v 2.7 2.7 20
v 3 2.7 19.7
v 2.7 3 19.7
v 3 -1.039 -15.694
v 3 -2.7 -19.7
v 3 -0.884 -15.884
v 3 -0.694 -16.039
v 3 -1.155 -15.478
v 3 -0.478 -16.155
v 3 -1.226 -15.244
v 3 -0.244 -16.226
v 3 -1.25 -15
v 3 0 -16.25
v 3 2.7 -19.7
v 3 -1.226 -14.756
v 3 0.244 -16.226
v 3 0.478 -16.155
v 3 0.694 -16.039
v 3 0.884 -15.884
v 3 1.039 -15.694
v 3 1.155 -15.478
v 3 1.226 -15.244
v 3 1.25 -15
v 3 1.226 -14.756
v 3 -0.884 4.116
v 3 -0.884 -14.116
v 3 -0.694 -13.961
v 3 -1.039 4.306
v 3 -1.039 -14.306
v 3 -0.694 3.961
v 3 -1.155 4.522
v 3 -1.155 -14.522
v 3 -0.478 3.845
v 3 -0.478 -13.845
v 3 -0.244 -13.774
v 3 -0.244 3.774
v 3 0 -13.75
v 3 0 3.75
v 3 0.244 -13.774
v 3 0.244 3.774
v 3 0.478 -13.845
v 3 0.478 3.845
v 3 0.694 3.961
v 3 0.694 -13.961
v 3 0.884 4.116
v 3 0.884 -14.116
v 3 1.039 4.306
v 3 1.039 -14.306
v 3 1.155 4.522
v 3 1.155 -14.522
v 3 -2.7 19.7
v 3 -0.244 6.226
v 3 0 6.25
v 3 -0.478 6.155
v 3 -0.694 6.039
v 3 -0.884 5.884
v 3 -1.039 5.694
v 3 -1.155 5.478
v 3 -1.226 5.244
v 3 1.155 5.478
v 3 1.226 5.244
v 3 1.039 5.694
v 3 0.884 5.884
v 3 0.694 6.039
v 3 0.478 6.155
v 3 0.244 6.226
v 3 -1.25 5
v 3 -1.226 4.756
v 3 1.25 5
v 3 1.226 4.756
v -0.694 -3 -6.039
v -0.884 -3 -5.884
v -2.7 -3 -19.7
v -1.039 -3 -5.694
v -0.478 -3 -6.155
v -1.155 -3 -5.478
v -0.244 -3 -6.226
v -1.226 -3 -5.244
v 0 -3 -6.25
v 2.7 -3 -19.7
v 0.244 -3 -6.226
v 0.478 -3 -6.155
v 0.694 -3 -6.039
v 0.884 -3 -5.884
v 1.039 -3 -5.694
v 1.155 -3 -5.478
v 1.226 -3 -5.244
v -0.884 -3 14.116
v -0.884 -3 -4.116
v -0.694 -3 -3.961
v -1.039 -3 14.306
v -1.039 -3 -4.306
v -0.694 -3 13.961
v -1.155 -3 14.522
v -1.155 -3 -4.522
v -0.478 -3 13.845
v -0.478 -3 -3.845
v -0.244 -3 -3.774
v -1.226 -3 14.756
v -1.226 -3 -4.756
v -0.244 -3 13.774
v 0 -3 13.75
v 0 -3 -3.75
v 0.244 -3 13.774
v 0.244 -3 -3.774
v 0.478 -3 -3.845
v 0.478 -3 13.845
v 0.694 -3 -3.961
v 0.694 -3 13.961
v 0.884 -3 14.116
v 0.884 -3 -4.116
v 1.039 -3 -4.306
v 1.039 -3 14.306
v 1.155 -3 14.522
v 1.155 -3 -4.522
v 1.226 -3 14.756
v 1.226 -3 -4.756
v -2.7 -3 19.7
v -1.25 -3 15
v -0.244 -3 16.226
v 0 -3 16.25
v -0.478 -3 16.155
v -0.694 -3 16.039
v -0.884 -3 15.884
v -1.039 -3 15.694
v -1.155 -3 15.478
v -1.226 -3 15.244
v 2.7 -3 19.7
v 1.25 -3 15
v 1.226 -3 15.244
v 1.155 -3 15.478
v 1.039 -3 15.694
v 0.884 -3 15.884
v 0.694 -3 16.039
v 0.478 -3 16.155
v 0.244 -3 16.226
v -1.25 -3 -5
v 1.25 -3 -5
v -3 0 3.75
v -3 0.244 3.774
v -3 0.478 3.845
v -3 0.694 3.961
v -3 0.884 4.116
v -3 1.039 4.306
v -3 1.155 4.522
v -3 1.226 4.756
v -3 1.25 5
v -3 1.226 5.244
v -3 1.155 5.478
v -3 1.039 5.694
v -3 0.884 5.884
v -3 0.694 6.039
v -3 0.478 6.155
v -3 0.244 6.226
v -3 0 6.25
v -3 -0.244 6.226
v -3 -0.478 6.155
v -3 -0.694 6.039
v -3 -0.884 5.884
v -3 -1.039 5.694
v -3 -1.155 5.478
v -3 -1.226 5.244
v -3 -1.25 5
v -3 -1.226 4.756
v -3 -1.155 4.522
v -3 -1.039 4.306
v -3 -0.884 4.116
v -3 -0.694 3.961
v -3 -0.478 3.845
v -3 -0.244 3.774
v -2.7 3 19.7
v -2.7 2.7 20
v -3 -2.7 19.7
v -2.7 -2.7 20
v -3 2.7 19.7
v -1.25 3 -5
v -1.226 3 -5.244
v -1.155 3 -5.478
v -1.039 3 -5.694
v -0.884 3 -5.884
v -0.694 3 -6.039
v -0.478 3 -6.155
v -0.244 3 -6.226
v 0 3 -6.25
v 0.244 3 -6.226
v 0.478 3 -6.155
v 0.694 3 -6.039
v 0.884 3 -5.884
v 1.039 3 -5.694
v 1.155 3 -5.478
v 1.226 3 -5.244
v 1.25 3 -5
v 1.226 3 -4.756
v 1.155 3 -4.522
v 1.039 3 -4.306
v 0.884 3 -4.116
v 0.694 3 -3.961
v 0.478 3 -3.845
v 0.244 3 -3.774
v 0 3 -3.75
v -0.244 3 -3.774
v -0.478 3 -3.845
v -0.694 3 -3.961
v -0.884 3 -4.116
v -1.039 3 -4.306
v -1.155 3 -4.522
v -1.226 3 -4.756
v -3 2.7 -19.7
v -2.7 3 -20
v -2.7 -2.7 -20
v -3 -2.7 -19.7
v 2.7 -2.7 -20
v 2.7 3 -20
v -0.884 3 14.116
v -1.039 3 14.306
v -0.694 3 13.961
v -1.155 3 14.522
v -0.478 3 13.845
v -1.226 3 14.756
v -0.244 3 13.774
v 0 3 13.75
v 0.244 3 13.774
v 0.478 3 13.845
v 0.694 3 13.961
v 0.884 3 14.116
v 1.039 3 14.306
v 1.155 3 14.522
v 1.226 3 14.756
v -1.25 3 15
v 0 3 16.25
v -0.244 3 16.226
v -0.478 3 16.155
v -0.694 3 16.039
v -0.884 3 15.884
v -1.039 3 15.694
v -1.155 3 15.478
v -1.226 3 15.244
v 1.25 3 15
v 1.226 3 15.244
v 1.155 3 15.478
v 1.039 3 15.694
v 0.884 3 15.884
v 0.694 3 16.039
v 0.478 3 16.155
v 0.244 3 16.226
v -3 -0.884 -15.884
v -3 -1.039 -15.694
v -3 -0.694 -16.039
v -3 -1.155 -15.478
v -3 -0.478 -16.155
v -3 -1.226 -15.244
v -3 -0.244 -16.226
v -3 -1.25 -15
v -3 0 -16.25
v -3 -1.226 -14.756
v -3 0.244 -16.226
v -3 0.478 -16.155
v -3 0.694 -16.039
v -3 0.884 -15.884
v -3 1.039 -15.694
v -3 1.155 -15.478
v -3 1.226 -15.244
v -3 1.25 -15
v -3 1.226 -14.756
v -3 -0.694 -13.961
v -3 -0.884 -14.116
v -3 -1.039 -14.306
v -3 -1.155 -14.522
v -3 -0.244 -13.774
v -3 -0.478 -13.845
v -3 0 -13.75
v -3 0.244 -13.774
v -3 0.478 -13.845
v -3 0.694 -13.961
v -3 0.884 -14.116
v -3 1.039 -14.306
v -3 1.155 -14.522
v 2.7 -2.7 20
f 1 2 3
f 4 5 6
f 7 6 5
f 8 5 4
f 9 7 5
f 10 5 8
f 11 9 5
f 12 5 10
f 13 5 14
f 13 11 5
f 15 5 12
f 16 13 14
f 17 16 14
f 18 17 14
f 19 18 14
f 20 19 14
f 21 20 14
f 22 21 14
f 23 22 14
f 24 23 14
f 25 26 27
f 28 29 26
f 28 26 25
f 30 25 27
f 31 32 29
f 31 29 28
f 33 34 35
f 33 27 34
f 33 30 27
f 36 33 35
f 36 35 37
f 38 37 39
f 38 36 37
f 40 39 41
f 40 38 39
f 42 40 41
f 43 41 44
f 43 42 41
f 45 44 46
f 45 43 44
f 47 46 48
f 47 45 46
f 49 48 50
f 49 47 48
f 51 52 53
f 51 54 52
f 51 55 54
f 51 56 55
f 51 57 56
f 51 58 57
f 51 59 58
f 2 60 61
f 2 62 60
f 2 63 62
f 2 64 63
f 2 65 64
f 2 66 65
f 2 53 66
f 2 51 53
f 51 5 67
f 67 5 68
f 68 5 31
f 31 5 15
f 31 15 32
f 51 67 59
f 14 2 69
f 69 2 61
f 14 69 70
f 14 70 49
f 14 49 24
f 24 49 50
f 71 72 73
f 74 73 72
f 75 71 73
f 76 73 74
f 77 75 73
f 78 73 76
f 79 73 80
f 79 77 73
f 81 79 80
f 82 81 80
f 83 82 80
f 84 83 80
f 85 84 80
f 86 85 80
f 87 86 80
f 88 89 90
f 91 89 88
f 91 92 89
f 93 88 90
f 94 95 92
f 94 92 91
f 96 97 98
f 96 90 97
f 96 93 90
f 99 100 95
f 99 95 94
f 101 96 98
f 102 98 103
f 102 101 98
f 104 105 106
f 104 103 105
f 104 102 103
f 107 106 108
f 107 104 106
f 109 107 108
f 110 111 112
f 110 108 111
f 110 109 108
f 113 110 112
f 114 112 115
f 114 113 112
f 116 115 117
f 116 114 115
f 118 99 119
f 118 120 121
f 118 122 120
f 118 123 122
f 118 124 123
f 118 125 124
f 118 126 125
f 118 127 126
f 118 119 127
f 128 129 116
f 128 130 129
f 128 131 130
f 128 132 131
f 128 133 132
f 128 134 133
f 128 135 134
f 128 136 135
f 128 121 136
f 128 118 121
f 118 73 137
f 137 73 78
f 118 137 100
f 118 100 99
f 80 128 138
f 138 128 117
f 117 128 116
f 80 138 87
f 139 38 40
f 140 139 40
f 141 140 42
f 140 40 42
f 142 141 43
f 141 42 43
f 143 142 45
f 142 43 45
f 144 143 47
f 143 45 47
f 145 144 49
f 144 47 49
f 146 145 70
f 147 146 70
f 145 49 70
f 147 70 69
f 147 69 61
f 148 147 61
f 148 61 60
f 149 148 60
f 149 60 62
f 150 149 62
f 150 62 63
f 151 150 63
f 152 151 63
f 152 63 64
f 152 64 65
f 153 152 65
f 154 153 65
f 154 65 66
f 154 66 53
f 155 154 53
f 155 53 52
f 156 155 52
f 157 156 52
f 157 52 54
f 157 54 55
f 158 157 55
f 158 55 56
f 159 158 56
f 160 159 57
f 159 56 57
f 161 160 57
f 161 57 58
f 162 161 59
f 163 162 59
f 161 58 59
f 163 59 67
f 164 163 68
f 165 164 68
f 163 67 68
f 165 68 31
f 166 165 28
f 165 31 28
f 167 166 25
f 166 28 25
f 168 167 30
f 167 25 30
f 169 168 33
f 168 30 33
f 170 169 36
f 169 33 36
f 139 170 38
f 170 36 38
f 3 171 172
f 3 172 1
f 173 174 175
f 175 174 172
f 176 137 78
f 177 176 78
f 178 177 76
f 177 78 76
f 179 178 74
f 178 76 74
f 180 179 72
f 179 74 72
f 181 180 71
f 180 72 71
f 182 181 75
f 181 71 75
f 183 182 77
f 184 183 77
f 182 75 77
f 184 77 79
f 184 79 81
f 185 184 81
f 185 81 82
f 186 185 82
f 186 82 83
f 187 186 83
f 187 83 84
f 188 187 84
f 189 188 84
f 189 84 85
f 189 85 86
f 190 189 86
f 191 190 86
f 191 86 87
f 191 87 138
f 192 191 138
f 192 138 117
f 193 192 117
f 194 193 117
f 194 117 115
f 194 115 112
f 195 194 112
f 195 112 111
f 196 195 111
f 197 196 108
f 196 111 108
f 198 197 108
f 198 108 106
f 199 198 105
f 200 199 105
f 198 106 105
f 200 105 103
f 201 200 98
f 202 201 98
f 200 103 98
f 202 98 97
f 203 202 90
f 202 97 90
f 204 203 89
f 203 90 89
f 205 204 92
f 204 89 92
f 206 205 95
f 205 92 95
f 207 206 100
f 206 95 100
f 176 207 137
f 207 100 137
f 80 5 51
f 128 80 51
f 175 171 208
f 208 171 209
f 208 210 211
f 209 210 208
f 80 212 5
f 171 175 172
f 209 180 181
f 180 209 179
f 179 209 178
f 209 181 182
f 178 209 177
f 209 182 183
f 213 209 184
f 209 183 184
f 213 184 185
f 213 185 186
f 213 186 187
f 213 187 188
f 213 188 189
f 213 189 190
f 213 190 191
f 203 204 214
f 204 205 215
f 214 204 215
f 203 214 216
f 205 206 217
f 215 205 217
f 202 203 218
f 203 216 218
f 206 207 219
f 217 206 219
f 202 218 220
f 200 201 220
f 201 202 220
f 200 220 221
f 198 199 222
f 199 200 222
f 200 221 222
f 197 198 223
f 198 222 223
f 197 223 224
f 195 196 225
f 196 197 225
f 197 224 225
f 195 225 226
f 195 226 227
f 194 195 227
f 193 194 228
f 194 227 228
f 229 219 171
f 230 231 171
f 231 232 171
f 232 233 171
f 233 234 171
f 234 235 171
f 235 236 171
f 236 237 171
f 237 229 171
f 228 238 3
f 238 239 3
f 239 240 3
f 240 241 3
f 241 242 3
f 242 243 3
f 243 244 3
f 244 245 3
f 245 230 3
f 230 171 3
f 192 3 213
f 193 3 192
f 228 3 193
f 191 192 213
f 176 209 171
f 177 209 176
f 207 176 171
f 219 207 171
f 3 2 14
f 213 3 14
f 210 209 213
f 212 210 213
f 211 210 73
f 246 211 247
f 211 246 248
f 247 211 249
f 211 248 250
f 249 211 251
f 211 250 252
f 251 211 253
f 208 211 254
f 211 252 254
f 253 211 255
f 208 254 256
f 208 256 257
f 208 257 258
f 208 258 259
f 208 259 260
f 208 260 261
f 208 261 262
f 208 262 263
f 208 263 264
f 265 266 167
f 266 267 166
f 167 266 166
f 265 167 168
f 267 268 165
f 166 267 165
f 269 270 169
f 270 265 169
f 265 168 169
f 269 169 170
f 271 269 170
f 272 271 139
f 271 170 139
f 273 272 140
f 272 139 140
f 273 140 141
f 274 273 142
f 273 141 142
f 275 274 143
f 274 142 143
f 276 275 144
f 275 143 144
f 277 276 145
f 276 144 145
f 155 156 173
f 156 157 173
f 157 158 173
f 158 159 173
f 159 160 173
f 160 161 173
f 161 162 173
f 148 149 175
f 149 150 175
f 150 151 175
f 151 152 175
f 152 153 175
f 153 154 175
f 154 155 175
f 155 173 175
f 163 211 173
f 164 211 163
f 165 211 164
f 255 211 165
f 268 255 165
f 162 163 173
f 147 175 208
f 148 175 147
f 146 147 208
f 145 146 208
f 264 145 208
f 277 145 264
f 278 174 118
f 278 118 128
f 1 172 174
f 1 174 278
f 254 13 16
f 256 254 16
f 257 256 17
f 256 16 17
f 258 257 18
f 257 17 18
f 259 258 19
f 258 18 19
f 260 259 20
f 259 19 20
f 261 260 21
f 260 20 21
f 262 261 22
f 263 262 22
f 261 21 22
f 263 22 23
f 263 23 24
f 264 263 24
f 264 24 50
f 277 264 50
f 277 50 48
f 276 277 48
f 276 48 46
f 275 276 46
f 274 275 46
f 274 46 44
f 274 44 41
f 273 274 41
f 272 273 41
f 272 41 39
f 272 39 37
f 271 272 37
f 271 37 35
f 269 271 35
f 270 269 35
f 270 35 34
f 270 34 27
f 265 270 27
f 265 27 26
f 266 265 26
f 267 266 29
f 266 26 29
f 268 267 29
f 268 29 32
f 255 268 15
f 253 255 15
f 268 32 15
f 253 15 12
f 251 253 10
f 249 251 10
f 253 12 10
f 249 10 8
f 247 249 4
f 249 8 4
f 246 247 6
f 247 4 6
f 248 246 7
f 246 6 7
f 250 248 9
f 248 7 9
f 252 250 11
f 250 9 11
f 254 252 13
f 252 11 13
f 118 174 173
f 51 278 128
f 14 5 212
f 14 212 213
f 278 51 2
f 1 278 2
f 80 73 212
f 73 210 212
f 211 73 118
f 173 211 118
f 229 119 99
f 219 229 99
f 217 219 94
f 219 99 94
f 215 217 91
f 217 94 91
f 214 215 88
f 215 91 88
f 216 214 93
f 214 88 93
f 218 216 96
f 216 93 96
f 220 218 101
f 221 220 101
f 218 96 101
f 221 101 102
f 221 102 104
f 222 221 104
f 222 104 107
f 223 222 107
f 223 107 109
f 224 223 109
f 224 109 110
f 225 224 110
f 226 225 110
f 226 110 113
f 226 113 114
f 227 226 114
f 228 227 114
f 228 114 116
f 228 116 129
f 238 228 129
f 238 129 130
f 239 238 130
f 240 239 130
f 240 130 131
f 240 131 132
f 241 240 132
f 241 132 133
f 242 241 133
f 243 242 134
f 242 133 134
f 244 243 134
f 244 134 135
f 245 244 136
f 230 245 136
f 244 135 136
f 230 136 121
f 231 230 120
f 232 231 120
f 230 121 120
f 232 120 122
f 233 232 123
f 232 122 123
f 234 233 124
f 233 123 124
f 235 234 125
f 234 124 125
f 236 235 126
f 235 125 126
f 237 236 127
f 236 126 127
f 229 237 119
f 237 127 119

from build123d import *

# Parameters (mm, degrees)
SKETCH_1_W          = 6
SKETCH_1_H          = 6
EXTRUDE_1_DEPTH     = 20
HOLE_WIZARD_1_D     = 2.5
HOLE_WIZARD_1_DEPTH = 6
HOLE_WIZARD_2_D     = 2.5
HOLE_WIZARD_2_DEPTH = 6
CHAMFER_1_SIZE      = 0.3


with BuildPart() as part:
    # 草图1 → 凸台-拉伸1 (new body, symmetric)
    with BuildSketch(Plane.XY):
        Rectangle(SKETCH_1_W, SKETCH_1_H)
    extrude(amount=EXTRUDE_1_DEPTH, both=True)

    # Hole Wizard 1
    with Locations(Plane.ZY.offset(3)):
        with Locations((-15, 0), (5, 0)):
            Hole(HOLE_WIZARD_1_D / 2, depth=HOLE_WIZARD_1_DEPTH)

    # Hole Wizard 2
    with Locations(Plane(origin=(0, 3, 0), x_dir=(1, 0, 0), z_dir=(0, 1, 0))):
        with Locations((0, 5), (0, -15)):
            Hole(HOLE_WIZARD_2_D / 2, depth=HOLE_WIZARD_2_DEPTH)

    # 倒角1
    chamfer_1_edges = [part.edges().sort_by_distance(p)[0] for p in [
        (-3, 0, 20),
        (0, -3, 20),
        (3, 0, 20),
        (0, -3, -20),
        (-3, 0, -20),
        (3, 0, -20),
        (3, -3, 0),
        (-3, -3, 0),
        (-3, 3, 0),
        (3, 3, 0),
        (0, 3, 20),
    ]]
    chamfer(chamfer_1_edges, length=CHAMFER_1_SIZE)


solid = part.part
